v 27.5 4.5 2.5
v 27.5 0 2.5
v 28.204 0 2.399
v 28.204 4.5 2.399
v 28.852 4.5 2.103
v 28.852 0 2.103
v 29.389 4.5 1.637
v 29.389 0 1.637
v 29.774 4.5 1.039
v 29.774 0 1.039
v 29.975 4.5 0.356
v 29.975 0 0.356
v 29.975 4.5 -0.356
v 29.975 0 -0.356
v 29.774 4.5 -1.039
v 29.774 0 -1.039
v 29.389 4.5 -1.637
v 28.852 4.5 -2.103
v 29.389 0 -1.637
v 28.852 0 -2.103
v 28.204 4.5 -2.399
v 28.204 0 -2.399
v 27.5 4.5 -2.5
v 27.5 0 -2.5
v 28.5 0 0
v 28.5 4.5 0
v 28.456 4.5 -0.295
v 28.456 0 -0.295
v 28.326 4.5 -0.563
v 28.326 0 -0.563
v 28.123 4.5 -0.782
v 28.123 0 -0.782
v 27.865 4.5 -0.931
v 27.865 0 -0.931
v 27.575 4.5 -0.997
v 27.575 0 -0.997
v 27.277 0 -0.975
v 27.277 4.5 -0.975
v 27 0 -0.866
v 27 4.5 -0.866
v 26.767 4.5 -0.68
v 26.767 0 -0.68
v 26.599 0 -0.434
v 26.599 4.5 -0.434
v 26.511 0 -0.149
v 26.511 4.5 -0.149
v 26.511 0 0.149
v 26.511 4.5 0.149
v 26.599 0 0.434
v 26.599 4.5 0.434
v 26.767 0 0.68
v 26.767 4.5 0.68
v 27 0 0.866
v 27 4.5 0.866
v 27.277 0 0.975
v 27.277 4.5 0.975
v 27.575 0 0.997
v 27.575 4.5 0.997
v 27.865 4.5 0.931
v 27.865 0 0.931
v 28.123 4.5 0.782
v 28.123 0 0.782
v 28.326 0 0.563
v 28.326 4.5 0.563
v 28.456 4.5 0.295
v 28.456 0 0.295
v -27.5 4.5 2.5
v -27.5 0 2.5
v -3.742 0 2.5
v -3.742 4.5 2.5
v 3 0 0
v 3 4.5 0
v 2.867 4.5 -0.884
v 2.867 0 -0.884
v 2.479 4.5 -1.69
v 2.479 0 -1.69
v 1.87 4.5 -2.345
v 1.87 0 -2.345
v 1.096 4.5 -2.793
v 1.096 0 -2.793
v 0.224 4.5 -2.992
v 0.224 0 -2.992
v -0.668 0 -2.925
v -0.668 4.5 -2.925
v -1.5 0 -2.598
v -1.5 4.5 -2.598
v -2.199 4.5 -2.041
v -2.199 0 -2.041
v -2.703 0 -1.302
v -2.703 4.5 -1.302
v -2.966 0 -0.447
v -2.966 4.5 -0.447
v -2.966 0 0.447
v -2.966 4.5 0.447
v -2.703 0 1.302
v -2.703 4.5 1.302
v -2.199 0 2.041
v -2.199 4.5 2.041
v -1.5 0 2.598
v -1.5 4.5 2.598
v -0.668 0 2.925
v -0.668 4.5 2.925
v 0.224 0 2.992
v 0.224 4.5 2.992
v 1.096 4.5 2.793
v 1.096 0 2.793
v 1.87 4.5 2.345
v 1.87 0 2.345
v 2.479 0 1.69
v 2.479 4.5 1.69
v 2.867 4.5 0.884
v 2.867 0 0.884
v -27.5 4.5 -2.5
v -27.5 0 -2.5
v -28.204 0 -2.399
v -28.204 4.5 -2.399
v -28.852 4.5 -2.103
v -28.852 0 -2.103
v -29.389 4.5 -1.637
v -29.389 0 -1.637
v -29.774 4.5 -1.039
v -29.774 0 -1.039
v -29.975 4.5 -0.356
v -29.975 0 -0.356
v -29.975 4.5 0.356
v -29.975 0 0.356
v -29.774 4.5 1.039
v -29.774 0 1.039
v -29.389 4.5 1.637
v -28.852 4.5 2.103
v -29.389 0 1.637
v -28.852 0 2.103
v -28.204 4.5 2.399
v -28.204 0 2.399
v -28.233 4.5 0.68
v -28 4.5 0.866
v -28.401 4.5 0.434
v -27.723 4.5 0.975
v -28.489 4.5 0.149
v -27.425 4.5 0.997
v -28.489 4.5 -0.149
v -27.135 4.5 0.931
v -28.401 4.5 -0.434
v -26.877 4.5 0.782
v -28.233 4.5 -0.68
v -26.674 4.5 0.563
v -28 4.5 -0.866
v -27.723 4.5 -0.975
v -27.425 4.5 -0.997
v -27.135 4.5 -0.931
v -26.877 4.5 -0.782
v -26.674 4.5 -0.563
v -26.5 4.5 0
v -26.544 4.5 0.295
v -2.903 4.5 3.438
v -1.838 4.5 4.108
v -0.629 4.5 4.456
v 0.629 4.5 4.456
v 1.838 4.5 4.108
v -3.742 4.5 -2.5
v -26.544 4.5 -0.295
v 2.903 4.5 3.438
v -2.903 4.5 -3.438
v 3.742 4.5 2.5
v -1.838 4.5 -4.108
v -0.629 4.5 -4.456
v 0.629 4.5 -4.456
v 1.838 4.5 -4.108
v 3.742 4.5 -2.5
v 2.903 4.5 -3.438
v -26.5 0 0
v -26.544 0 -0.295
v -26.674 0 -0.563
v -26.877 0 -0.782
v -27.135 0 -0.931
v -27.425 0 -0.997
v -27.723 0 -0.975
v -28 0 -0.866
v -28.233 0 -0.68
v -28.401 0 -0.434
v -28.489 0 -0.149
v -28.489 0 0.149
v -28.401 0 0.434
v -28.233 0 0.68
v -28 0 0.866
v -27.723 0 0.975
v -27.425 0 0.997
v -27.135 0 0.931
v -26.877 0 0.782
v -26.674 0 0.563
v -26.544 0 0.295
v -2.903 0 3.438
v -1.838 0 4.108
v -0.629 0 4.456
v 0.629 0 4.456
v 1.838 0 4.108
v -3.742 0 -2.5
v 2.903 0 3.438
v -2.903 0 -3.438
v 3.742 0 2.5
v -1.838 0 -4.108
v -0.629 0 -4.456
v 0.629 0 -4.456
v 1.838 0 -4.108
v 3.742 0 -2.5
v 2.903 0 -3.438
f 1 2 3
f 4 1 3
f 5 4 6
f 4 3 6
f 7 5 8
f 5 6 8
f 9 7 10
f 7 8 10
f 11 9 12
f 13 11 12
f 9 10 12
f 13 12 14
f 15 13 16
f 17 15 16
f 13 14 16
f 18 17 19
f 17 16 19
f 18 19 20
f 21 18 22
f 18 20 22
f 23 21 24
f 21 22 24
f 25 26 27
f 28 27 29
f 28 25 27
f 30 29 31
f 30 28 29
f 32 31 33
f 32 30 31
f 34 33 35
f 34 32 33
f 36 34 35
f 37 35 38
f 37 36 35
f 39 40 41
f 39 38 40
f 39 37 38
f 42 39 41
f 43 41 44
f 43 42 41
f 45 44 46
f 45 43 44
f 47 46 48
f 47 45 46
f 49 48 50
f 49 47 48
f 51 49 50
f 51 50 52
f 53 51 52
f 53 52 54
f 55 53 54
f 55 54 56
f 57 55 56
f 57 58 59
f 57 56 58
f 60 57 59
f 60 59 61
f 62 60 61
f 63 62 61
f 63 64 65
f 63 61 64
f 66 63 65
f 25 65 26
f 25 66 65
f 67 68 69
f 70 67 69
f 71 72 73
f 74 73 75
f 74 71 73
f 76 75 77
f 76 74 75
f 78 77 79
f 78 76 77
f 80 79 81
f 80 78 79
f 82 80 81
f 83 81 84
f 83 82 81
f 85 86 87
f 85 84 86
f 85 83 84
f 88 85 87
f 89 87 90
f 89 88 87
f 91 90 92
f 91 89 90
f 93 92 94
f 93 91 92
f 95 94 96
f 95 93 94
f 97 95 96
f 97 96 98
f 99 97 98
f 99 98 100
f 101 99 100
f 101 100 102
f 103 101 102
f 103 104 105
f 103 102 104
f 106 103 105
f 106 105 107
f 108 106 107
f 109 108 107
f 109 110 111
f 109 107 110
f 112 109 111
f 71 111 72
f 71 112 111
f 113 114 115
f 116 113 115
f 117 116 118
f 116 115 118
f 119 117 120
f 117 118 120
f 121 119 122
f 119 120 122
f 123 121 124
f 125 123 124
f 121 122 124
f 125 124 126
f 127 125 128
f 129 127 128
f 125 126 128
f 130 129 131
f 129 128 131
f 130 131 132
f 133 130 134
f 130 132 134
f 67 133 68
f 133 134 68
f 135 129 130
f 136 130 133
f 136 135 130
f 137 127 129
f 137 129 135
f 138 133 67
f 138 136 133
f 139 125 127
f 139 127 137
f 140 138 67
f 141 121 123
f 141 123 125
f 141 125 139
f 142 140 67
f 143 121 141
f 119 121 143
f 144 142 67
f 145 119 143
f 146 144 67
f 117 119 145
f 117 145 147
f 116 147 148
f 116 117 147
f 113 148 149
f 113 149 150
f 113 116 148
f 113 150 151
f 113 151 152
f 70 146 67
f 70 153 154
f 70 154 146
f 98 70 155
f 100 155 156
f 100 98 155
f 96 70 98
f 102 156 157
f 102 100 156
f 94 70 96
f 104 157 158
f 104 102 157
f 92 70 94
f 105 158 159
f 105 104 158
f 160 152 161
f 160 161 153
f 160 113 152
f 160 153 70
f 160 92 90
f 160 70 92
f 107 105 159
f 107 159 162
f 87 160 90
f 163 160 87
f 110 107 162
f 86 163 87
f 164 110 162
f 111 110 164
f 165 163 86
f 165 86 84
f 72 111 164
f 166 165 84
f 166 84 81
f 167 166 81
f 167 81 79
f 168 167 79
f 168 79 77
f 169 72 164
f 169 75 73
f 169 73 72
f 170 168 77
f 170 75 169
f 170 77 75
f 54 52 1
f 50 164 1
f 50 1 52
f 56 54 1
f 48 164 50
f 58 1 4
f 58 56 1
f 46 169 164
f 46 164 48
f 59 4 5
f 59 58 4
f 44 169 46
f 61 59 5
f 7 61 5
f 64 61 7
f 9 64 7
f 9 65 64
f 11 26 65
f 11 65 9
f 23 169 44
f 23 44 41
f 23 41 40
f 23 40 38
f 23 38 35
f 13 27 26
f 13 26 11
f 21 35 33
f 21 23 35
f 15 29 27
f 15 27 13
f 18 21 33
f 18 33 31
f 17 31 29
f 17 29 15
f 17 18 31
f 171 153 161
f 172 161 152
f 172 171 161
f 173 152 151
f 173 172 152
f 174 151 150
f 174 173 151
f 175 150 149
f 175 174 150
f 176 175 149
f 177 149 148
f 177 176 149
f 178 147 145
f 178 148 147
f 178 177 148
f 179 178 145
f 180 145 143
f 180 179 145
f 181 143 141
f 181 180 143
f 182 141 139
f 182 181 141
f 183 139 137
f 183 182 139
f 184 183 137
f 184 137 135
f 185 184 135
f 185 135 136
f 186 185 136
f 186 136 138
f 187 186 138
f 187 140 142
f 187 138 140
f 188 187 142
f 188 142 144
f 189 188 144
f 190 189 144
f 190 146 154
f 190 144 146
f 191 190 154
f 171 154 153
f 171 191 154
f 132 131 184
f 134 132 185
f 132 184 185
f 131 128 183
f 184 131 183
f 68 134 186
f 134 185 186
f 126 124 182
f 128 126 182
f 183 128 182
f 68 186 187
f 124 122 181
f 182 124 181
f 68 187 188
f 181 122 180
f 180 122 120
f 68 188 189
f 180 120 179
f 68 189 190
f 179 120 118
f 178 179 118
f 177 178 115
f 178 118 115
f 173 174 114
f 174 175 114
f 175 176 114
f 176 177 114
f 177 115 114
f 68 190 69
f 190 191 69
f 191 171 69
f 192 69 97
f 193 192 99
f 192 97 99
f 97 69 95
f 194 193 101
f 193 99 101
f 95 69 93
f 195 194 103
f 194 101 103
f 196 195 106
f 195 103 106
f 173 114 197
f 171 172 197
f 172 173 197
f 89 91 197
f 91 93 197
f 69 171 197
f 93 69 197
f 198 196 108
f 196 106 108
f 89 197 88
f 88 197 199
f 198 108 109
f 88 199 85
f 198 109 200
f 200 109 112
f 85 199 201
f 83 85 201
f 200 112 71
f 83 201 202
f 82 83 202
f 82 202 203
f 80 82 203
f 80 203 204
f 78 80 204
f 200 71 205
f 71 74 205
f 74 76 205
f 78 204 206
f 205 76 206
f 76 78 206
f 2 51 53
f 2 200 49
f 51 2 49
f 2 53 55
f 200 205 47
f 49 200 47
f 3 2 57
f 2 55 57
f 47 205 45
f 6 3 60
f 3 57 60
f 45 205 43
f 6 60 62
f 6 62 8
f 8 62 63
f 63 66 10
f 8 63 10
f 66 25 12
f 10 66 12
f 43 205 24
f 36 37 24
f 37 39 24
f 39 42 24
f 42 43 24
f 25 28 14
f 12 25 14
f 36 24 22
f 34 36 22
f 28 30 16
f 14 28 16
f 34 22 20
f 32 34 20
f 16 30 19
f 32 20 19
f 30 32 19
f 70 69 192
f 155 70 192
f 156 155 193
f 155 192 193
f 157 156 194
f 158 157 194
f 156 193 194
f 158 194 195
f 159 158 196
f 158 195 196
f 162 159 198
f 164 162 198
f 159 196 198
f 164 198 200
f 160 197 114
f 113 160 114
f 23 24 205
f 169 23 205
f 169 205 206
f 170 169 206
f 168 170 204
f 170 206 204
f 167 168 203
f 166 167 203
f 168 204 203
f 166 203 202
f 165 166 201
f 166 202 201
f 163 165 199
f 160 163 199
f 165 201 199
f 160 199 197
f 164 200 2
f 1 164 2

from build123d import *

# Parameters (mm, degrees)
BOSS_EXTRUDE2_DEPTH     = 4.5
SKETCH2_R               = 3
CUT_EXTRUDE1_DEPTH      = 5.5
CUT_EXTRUDE1_DEPTH_BACK = 1
SKETCH3_R               = 1
CUT_EXTRUDE2_DEPTH      = 5.5
CUT_EXTRUDE2_DEPTH_BACK = 1


with BuildPart() as part:
    # Sketch1 → Boss-Extrude2 (new body)
    with BuildSketch(Plane(origin=(0, 0, 0), x_dir=(1, 0, 0), z_dir=(0, 1, 0))):
        with BuildLine():
            Line((-3.741657387, 2.5), (-27.5, 2.5))
            ThreePointArc((-27.5, 2.5), (-30, 0), (-27.5, -2.5))
            Line((-27.5, -2.5), (-3.741657387, -2.5))
            ThreePointArc((-3.741657387, -2.5), (0, -4.5), (3.741657387, -2.5))
            Line((3.741657387, -2.5), (27.5, -2.5))
            ThreePointArc((27.5, -2.5), (30, 0), (27.5, 2.5))
            Line((27.5, 2.5), (3.741657387, 2.5))
            ThreePointArc((3.741657387, 2.5), (0, 4.5), (-3.741657387, 2.5))
        make_face()
    extrude(amount=BOSS_EXTRUDE2_DEPTH)

    # Sketch2 → Cut-Extrude1 (cut, two sides)
    with BuildSketch(Plane(origin=(0, 0, 0), x_dir=(1, 0, 0), z_dir=(0, 1, 0))) as cut_extrude1_sk:
        Circle(SKETCH2_R)
    extrude(amount=CUT_EXTRUDE1_DEPTH, mode=Mode.SUBTRACT)
    extrude(cut_extrude1_sk.sketch, amount=-CUT_EXTRUDE1_DEPTH_BACK, mode=Mode.SUBTRACT)

    # Sketch3 → Cut-Extrude2 (cut, two sides)
    with BuildSketch(Plane(origin=(0, 0, 0), x_dir=(1, 0, 0), z_dir=(0, 1, 0))) as cut_extrude2_sk:
        with Locations((-27.5, 0)):
            Circle(SKETCH3_R)
        with Locations((27.5, 0)):
            Circle(SKETCH3_R)
    extrude(amount=CUT_EXTRUDE2_DEPTH, mode=Mode.SUBTRACT)
    extrude(cut_extrude2_sk.sketch, amount=-CUT_EXTRUDE2_DEPTH_BACK, mode=Mode.SUBTRACT)


solid = part.part
